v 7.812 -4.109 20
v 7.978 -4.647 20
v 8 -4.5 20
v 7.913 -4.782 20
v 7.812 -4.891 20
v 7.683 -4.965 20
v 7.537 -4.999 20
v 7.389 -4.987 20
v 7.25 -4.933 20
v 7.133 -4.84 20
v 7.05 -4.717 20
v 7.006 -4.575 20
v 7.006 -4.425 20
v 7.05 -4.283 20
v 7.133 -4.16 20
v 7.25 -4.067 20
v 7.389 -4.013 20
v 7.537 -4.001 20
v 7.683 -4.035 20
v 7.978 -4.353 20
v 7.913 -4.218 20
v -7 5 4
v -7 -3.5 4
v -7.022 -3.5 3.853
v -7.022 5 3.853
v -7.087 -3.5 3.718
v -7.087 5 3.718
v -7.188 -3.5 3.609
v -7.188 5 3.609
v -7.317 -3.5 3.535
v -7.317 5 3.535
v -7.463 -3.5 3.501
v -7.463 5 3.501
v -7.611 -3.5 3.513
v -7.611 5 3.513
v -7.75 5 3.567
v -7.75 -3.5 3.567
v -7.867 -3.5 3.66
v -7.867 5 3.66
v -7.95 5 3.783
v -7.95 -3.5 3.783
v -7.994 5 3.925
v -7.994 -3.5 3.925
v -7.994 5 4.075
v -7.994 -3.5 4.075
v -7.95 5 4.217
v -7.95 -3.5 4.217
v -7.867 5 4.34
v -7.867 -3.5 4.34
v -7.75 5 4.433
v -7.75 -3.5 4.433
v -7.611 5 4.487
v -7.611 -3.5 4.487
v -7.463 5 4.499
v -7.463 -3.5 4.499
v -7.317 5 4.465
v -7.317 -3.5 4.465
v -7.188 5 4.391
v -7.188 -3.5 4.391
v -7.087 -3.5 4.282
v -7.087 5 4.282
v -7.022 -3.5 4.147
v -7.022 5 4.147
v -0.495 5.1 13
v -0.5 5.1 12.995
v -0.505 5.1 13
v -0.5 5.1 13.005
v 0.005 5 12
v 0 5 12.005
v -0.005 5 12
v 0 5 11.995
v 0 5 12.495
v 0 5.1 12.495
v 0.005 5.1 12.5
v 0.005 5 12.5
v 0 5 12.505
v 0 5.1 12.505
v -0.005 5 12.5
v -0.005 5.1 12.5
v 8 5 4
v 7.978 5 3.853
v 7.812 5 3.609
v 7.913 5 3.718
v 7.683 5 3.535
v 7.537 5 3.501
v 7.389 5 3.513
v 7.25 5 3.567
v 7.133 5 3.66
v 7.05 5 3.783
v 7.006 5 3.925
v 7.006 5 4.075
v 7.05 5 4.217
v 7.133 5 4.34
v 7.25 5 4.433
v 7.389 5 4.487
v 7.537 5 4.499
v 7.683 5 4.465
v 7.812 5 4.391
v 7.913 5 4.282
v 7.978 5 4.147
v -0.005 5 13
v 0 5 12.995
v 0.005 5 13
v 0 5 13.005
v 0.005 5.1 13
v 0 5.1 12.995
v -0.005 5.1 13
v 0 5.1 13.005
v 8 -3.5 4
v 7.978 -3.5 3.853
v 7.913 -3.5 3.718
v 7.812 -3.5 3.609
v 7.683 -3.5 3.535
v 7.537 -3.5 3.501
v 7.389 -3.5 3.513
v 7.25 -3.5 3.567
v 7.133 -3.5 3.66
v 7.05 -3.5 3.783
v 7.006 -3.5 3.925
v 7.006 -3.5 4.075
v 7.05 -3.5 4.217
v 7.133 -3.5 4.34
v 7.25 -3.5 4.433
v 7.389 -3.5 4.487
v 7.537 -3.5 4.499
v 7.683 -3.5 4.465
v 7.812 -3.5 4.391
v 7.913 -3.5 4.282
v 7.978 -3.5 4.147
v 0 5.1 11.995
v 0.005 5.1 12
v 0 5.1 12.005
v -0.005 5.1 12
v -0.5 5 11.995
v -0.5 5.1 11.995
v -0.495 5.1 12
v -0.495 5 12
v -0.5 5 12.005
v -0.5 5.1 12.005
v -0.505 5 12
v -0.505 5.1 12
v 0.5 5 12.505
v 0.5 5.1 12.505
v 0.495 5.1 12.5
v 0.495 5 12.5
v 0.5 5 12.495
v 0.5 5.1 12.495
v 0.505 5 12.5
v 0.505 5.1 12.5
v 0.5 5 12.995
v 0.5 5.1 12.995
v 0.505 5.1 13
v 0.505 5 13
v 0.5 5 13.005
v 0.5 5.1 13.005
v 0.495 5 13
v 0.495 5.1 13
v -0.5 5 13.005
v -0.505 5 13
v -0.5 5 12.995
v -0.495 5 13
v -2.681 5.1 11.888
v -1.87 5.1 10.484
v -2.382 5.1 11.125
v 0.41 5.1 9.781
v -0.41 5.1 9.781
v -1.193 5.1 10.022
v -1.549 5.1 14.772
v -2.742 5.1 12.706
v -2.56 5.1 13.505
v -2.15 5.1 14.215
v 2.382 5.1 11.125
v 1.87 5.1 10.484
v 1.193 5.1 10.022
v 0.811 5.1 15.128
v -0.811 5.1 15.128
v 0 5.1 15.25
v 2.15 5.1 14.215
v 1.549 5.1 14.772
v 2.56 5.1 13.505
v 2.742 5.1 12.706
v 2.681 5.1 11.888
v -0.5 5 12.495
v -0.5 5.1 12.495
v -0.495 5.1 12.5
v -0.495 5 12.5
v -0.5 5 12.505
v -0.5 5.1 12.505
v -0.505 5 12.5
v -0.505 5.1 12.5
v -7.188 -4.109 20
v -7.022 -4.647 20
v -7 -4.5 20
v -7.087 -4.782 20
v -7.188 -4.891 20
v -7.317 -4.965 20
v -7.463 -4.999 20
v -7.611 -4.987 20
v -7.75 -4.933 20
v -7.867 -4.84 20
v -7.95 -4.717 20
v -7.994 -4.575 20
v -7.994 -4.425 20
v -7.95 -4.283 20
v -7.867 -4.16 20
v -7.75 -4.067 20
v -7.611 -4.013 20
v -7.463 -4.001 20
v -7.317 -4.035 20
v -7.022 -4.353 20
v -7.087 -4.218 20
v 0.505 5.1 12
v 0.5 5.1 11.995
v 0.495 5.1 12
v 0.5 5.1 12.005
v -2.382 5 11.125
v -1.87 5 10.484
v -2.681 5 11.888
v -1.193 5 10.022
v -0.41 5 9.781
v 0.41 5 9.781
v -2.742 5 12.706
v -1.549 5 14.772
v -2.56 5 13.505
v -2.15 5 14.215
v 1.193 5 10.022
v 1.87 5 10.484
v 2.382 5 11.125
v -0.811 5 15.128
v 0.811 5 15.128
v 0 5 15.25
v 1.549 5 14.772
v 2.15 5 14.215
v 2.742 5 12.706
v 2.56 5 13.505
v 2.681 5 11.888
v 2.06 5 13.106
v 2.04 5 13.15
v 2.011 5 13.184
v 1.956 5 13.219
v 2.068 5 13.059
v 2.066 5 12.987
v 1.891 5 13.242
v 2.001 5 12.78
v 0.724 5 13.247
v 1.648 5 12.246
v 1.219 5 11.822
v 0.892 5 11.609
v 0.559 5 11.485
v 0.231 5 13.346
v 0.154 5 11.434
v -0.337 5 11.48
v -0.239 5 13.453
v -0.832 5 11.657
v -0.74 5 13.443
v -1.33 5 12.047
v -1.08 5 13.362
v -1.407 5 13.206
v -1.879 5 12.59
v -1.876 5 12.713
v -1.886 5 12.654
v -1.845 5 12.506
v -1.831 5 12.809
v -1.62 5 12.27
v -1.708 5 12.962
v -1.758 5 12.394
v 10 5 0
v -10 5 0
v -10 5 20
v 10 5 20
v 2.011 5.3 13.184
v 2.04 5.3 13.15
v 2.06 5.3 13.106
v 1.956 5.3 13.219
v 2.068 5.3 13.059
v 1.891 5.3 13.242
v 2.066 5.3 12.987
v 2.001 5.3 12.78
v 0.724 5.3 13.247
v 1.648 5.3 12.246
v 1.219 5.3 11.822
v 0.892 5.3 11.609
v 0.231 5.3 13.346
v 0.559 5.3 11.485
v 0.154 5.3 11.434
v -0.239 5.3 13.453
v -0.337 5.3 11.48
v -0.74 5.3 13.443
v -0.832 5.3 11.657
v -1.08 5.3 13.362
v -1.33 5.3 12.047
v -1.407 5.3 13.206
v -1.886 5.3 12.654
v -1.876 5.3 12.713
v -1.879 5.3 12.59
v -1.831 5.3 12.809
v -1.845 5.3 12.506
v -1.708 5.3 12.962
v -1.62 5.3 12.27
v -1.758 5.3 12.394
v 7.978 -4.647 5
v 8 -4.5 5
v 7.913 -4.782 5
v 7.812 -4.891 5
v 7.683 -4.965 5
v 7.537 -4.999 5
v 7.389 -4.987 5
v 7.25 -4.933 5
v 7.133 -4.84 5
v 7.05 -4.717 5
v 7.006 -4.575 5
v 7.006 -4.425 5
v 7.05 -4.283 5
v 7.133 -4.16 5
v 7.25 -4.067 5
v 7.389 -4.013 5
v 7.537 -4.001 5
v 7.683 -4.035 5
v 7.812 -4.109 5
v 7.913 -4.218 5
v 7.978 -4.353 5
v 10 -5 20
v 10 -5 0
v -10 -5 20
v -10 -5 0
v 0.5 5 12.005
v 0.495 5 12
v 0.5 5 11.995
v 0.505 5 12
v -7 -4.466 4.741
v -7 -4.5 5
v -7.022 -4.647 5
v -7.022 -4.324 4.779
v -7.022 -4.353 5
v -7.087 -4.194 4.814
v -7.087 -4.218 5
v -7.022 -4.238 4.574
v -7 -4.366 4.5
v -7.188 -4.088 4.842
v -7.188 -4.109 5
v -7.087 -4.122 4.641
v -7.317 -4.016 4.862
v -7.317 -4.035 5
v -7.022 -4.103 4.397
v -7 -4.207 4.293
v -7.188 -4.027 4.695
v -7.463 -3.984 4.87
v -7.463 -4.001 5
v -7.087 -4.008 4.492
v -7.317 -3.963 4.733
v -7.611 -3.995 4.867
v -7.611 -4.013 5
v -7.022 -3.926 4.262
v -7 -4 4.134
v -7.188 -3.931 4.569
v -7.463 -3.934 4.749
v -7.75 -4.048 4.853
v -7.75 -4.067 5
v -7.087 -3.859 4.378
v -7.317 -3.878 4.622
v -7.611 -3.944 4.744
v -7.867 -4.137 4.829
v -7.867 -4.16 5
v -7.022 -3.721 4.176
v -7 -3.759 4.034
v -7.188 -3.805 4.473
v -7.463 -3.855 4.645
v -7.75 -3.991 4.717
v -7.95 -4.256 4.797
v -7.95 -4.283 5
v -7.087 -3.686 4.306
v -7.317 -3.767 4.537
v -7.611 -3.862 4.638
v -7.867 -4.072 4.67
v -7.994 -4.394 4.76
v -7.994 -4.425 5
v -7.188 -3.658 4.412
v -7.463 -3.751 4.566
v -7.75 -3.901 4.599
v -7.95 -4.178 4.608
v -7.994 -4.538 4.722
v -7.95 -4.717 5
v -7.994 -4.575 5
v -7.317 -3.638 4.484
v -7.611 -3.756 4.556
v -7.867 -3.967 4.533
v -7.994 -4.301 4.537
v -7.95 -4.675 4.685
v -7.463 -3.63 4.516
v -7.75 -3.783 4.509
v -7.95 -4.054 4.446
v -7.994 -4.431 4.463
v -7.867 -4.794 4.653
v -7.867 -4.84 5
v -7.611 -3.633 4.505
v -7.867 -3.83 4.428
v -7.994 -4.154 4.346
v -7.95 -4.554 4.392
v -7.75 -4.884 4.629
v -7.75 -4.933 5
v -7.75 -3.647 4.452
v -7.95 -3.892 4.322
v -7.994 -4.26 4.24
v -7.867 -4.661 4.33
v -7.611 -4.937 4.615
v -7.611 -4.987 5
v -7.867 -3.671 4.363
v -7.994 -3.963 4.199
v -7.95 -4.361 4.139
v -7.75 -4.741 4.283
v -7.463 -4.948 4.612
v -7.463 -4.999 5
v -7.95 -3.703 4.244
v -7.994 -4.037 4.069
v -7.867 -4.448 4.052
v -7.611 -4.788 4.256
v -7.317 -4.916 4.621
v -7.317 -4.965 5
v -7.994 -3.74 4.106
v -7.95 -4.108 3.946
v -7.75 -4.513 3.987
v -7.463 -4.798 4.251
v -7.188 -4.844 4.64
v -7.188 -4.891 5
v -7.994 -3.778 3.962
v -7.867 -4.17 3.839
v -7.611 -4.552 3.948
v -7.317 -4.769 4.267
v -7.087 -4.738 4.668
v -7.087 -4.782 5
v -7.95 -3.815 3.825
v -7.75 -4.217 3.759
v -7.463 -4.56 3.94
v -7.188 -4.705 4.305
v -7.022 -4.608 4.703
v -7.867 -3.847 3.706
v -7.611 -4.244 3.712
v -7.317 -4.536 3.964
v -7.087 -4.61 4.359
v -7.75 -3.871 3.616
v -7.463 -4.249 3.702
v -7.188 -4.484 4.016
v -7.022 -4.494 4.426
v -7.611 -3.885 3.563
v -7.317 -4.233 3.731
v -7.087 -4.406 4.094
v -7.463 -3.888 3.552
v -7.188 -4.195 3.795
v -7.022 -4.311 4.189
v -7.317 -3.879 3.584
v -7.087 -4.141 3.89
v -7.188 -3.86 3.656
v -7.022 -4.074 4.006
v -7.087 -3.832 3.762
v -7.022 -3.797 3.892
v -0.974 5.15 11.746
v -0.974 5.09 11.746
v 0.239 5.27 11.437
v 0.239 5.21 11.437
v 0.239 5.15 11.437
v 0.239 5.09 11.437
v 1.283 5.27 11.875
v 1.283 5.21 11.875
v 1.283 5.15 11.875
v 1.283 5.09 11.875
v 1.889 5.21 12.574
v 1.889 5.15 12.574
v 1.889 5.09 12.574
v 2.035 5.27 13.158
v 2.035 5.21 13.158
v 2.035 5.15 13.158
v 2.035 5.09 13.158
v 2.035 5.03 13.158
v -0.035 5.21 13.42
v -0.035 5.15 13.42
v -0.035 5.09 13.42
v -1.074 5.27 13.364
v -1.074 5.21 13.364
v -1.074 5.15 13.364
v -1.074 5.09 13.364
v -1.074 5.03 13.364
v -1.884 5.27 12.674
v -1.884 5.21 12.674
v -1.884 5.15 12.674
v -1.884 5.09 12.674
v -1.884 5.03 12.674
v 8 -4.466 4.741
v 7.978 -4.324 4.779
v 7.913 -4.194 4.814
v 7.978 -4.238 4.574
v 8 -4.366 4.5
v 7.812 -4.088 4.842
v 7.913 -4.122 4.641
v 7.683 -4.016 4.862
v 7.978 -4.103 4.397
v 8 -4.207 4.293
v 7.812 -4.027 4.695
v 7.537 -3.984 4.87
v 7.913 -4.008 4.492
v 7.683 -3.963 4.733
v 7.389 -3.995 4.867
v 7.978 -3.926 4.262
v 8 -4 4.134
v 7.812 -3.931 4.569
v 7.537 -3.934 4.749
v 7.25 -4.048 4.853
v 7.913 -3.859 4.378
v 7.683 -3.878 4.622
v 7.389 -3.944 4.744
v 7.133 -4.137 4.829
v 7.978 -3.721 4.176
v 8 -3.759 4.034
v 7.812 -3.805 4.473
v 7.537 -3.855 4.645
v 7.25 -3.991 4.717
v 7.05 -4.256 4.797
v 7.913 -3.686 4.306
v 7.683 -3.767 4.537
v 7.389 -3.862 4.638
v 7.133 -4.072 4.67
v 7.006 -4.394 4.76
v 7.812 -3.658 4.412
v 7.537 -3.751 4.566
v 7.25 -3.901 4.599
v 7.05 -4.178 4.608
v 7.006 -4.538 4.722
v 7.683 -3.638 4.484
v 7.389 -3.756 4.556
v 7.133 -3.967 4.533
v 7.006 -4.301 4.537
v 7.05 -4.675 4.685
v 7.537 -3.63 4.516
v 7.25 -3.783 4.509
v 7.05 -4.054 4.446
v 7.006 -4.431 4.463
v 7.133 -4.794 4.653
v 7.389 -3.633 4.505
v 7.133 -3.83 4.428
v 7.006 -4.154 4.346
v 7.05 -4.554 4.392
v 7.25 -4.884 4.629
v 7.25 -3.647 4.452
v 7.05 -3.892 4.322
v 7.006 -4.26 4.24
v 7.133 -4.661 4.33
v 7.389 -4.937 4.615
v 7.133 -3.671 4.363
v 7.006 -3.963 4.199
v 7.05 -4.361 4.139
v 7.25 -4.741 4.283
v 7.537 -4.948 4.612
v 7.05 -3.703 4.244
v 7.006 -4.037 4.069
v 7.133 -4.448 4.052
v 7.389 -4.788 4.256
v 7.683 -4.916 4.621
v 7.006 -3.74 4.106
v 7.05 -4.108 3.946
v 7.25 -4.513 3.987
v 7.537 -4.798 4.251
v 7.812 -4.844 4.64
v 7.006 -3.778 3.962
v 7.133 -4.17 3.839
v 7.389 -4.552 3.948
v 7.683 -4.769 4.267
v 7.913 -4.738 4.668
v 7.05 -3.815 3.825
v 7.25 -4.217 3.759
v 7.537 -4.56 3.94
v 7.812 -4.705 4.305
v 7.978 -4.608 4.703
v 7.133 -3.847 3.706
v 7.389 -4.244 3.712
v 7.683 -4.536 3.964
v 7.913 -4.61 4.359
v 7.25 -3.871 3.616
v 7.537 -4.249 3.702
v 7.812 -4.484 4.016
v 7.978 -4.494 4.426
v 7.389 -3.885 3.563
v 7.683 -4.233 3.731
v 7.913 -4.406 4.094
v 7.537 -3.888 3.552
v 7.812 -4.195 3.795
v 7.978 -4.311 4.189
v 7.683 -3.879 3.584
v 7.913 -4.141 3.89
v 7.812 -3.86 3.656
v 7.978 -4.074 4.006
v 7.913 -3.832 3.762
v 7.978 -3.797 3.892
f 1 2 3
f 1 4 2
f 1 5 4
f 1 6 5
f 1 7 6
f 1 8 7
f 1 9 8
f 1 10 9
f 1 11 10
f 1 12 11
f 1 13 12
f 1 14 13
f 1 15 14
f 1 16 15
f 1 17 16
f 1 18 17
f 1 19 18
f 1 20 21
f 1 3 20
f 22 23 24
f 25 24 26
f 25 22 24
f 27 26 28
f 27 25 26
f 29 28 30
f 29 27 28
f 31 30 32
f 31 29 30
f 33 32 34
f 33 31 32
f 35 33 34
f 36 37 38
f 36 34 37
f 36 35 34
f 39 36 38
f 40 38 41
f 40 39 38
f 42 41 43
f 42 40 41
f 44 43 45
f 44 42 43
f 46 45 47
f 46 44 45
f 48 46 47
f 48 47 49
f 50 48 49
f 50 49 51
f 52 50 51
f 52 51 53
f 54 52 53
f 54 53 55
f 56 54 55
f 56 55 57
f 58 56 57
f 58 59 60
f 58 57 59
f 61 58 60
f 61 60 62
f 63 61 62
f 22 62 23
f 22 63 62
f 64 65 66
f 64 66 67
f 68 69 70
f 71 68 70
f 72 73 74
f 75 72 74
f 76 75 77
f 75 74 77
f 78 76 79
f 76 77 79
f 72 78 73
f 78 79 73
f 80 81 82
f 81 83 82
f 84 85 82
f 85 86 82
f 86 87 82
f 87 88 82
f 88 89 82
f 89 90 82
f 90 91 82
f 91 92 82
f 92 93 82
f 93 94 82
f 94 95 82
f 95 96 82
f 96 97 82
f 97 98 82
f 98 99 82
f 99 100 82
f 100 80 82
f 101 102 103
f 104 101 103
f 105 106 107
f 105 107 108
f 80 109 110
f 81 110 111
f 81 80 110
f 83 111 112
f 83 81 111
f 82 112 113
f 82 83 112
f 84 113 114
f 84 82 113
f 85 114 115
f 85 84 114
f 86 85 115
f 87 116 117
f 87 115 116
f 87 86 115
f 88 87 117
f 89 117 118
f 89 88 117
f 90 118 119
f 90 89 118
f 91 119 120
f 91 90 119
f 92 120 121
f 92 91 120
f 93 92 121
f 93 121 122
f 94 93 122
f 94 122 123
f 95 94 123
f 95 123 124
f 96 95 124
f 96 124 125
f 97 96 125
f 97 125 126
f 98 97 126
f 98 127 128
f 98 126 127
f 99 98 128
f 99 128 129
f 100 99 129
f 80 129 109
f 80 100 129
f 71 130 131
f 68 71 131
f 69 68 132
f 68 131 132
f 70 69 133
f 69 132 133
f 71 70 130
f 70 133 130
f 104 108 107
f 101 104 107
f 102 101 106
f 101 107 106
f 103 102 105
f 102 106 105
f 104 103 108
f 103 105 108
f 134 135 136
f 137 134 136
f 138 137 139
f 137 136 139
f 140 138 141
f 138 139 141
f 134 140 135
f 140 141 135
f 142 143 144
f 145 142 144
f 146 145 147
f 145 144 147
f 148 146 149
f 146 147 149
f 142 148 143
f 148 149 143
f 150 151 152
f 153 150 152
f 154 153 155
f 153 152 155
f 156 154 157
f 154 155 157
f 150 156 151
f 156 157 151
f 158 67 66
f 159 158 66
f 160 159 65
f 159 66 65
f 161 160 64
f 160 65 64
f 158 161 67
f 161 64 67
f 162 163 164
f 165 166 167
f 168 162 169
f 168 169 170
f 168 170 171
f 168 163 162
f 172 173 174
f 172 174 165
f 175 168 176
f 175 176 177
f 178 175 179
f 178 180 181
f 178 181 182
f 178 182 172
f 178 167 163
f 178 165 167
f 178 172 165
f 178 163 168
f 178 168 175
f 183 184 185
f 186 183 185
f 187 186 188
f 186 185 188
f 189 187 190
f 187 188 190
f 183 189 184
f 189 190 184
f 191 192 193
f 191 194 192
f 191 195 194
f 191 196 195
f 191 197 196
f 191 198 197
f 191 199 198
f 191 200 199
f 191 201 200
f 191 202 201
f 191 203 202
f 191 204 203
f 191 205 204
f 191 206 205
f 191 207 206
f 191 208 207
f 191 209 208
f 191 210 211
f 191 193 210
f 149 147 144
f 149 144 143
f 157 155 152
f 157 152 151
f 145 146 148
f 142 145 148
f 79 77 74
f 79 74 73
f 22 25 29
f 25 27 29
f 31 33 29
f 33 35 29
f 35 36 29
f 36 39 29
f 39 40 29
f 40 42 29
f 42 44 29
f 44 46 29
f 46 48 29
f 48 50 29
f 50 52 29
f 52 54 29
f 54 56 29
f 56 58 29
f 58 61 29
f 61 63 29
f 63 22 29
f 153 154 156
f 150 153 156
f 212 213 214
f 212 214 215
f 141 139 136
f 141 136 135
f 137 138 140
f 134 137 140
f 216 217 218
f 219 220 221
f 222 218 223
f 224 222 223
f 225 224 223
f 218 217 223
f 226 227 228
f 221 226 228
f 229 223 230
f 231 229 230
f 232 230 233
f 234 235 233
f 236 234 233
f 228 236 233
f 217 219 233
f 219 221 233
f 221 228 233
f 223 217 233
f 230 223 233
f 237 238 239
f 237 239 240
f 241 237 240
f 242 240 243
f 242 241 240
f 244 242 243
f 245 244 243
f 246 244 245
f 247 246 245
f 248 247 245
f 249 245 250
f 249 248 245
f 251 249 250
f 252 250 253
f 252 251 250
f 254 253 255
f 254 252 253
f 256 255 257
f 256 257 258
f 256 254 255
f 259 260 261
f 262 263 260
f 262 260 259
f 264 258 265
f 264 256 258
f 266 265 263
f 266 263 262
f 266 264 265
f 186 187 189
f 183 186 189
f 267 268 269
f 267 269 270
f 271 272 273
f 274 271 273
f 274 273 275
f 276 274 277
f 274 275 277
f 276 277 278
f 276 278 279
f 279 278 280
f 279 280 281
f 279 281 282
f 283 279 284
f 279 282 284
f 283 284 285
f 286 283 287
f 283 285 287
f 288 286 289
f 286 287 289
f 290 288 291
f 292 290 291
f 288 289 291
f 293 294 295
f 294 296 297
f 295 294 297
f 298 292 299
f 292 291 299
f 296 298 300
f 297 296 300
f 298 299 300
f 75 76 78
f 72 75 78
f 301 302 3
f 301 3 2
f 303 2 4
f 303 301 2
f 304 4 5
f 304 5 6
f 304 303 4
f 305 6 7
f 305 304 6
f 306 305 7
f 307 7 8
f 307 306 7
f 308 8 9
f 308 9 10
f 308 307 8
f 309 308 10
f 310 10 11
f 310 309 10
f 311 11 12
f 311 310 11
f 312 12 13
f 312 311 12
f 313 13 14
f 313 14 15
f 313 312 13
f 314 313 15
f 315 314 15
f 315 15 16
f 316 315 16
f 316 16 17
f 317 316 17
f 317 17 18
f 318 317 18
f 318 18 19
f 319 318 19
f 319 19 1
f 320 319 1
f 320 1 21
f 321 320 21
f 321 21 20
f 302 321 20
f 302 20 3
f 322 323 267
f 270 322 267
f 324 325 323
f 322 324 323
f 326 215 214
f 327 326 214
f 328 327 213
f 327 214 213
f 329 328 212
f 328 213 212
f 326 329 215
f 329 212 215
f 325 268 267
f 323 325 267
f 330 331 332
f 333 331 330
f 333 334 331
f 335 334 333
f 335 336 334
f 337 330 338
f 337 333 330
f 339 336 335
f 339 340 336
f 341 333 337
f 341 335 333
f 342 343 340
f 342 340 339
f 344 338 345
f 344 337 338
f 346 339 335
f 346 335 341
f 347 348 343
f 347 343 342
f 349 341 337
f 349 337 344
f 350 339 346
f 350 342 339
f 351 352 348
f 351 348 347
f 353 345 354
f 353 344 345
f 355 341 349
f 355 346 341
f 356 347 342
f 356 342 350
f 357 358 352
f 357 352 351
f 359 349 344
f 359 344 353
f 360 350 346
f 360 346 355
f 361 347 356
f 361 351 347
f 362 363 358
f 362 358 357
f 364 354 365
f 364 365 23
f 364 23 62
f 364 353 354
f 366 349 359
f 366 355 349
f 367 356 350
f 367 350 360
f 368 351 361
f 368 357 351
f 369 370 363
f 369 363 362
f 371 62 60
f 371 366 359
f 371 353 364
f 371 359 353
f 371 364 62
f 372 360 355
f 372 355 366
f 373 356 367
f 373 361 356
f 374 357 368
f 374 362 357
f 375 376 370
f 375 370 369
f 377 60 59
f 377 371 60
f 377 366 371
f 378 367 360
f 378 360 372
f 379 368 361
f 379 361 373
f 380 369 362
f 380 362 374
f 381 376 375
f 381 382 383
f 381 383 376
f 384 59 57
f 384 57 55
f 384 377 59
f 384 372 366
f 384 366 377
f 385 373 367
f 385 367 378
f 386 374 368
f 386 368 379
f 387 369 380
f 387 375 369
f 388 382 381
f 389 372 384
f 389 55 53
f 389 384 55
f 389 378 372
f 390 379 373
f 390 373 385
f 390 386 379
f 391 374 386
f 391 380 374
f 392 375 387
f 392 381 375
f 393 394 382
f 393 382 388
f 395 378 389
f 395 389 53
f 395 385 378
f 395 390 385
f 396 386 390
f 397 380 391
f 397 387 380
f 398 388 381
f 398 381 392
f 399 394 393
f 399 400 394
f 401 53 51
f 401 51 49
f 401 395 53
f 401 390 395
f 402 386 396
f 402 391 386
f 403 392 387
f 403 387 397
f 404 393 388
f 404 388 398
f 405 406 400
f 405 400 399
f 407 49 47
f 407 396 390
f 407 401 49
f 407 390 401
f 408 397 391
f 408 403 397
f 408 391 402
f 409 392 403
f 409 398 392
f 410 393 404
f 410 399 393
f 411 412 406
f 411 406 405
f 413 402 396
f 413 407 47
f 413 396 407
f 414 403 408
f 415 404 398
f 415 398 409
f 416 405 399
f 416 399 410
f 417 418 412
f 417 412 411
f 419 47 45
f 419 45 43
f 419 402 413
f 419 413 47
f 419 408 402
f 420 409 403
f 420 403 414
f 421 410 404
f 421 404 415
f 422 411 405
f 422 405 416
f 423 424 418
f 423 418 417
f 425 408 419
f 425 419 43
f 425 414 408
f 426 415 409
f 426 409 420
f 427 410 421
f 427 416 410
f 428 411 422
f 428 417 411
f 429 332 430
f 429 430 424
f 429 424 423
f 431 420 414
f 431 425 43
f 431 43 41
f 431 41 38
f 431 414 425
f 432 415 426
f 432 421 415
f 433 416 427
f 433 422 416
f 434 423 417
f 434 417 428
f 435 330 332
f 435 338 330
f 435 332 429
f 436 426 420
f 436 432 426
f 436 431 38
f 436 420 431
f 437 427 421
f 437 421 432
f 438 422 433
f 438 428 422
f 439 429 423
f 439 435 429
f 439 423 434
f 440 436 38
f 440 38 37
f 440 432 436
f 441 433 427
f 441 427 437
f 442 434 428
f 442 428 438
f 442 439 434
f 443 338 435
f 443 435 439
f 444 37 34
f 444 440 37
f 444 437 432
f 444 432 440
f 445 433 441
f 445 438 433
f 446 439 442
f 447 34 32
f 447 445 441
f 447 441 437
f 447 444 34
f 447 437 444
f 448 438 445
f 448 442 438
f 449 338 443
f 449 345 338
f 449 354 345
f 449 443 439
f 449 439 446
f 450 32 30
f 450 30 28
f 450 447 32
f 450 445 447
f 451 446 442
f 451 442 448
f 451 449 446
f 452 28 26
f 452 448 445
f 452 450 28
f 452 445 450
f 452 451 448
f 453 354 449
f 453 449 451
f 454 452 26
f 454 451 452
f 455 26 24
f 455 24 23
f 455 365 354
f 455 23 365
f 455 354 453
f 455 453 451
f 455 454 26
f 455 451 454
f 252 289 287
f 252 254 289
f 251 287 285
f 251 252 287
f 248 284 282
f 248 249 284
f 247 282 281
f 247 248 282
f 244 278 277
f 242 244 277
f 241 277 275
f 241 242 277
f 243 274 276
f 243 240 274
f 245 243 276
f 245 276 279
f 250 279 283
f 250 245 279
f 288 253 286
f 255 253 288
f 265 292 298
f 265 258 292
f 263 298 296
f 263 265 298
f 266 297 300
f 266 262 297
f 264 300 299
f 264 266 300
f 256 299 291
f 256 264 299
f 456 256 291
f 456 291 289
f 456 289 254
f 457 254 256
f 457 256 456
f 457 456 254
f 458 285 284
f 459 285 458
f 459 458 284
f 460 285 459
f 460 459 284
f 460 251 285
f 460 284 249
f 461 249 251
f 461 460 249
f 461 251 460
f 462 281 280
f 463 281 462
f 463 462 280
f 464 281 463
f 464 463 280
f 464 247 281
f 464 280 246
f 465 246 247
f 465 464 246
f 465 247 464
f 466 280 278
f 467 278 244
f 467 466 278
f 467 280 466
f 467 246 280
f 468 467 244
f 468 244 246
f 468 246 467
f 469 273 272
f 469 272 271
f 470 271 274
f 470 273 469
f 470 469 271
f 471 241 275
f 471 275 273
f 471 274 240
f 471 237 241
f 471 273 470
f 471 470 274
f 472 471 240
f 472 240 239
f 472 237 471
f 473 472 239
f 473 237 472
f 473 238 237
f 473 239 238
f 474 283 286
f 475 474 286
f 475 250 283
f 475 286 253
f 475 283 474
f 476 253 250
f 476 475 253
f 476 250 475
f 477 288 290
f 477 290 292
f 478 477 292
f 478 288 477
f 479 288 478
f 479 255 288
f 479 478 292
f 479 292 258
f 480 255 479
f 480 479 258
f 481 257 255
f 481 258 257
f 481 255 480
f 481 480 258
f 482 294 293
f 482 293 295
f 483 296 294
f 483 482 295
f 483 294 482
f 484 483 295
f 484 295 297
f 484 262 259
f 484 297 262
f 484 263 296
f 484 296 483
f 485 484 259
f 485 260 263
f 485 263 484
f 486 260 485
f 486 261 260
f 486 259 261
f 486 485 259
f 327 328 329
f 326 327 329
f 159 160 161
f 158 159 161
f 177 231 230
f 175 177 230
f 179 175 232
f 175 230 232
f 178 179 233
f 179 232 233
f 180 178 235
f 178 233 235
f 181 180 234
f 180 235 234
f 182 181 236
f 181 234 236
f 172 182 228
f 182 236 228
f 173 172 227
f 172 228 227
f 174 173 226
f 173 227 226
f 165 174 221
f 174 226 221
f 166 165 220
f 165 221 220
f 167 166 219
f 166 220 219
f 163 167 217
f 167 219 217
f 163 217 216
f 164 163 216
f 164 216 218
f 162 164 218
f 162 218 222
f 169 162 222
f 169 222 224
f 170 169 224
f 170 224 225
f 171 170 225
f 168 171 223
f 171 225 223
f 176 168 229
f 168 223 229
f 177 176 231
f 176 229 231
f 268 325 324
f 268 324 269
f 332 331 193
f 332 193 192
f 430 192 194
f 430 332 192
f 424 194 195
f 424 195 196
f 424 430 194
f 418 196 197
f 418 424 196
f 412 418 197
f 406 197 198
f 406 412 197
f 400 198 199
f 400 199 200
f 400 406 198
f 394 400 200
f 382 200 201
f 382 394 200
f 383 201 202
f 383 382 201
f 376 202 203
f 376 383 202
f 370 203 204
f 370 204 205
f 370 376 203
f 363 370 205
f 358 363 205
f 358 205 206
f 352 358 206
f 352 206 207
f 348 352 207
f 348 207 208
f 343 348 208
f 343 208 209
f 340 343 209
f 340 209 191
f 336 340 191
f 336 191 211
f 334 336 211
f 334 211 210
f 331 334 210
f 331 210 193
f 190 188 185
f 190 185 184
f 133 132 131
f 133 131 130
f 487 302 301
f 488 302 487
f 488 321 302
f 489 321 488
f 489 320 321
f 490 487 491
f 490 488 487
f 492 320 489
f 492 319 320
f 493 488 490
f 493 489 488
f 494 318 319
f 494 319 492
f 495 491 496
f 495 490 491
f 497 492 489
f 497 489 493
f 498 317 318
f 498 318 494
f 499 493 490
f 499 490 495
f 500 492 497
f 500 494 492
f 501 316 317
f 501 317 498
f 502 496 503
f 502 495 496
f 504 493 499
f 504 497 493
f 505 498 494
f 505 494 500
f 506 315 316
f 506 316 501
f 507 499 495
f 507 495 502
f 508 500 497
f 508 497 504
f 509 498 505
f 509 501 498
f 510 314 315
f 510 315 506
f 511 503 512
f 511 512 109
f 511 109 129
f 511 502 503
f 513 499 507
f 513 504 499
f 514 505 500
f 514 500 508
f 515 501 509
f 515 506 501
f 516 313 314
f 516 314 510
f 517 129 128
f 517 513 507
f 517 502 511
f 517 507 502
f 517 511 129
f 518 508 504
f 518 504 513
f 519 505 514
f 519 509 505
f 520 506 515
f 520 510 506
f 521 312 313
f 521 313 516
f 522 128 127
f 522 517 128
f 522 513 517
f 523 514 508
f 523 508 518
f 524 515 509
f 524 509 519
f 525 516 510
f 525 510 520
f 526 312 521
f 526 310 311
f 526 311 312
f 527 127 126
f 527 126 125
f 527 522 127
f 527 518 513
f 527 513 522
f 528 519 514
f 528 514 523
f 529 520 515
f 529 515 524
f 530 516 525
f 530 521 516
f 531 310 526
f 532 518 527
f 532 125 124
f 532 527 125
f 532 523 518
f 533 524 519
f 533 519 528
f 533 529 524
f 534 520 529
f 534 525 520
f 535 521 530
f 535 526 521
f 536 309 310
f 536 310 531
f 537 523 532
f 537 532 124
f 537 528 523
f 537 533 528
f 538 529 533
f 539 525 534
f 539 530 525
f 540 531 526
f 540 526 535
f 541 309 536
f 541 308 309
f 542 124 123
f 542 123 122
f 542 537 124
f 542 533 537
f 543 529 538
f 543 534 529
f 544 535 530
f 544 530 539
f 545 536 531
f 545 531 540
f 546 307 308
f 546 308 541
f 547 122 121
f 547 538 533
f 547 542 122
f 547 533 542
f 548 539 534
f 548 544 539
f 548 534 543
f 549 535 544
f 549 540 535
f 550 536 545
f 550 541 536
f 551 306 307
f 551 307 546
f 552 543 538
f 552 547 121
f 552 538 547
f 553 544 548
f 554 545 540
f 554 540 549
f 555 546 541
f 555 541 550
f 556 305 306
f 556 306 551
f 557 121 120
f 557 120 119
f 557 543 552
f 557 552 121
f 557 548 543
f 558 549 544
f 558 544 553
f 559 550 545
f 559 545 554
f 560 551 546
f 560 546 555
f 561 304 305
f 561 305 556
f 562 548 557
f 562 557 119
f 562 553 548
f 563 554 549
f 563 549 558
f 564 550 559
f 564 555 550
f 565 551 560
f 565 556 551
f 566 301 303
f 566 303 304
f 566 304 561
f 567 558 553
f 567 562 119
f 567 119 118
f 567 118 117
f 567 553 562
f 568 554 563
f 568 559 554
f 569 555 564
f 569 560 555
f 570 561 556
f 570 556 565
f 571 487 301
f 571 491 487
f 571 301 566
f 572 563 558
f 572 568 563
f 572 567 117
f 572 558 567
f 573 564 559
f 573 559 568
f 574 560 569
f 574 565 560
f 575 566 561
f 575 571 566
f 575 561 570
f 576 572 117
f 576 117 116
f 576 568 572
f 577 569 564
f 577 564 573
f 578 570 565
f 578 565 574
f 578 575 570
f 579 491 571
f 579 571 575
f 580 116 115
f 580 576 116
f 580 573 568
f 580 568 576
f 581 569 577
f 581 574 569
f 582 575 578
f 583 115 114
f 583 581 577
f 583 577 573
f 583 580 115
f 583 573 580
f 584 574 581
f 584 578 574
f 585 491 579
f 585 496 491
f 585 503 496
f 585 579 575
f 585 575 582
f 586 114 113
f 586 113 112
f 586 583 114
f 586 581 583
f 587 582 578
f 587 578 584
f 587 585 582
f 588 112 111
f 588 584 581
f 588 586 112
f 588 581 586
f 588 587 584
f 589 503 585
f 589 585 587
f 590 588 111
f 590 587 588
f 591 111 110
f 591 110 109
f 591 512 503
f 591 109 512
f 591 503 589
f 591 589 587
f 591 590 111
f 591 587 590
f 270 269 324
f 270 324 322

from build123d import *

# Parameters (mm, degrees)
SKETCH1_W             = 20
SKETCH1_H             = 10
BOSS_EXTRUDE1_DEPTH   = 20
SKETCH2_R             = 0.5
SKETCH5_R             = 2.75
BOSS_EXTRUDE4_DEPTH   = 0.1
SKETCH8_R             = 0.005
BOSS_EXTRUDE5_DEPTH   = 0.1
BOSS_EXTRUDE5_2_DEPTH = 0.1
BOSS_EXTRUDE5_3_DEPTH = 0.1
BOSS_EXTRUDE5_4_DEPTH = 0.1
BOSS_EXTRUDE5_5_DEPTH = 0.1
BOSS_EXTRUDE5_6_DEPTH = 0.1
BOSS_EXTRUDE5_7_DEPTH = 0.1
BOSS_EXTRUDE5_8_DEPTH = 0.1
BOSS_EXTRUDE5_9_DEPTH = 0.1
SLICE_2_DEPTH         = 0.3


with BuildPart() as part:
    # Sketch1 → Boss-Extrude1 (new body)
    with BuildSketch(Plane.XY):
        Rectangle(SKETCH1_W, SKETCH1_H)
    extrude(amount=BOSS_EXTRUDE1_DEPTH)


with BuildPart() as body_2:
    # ag/agcl electrodes: sweep along a path in Sketch3
    with BuildLine(Plane(origin=(7.5, 0, 0), x_dir=(0, 0, -1), z_dir=(1, 0, 0))) as ag_agcl_electrodes_path:
        Line((-20, -4.5), (-5, -4.5))
        ThreePointArc((-5, -4.5), (-4.292893219, -4.207106781), (-4, -3.5))
        Line((-4, -3.5), (-4, 5))
    # Sketch2 → ag/agcl electrodes (sweep)
    with BuildSketch(Plane.XY.offset(20)):
        with Locations((-7.5, -4.5)):
            Circle(SKETCH2_R)
        with Locations((7.5, -4.5)):
            Circle(SKETCH2_R)
    sweep(path=ag_agcl_electrodes_path.line)


with BuildPart() as body_3:
    # Sketch5 → Boss-Extrude4 (new body)
    with BuildSketch(Plane(origin=(0, 5, 0), x_dir=(1, 0, 0), z_dir=(0, 1, 0))):
        with Locations(Location((0, -12.5, 0), (0, 0, 270))):
            Circle(SKETCH5_R)
    extrude(amount=BOSS_EXTRUDE4_DEPTH)


with BuildPart() as body_4:
    # Sketch8 → Boss-Extrude5 (new body)
    with BuildSketch(Plane(origin=(0, 5.1, 0), x_dir=(-1, 0, 0), z_dir=(0, -1, 0))):
        with Locations(Location((0, -12.5, 0), (0, 0, 90))):
            Circle(SKETCH8_R)
    extrude(amount=BOSS_EXTRUDE5_DEPTH)


with BuildPart() as body_5:
    # Sketch8 → Boss-Extrude5 2 (new body)
    with BuildSketch(Plane(origin=(0, 5.1, 0), x_dir=(-1, 0, 0), z_dir=(0, -1, 0))):
        with Locations(Location((0.5, -12.5, 0), (0, 0, 90))):
            Circle(SKETCH8_R)
    extrude(amount=BOSS_EXTRUDE5_2_DEPTH)


with BuildPart() as body_6:
    # Sketch8 → Boss-Extrude5 3 (new body)
    with BuildSketch(Plane(origin=(0, 5.1, 0), x_dir=(-1, 0, 0), z_dir=(0, -1, 0))):
        with Locations(Location((0.5, -12, 0), (0, 0, 90))):
            Circle(SKETCH8_R)
    extrude(amount=BOSS_EXTRUDE5_3_DEPTH)


with BuildPart() as body_7:
    # Sketch8 → Boss-Extrude5 4 (new body)
    with BuildSketch(Plane(origin=(0, 5.1, 0), x_dir=(-1, 0, 0), z_dir=(0, -1, 0))):
        with Locations(Location((0, -12, 0), (0, 0, 90))):
            Circle(SKETCH8_R)
    extrude(amount=BOSS_EXTRUDE5_4_DEPTH)


with BuildPart() as body_8:
    # Sketch8 → Boss-Extrude5 5 (new body)
    with BuildSketch(Plane(origin=(0, 5.1, 0), x_dir=(-1, 0, 0), z_dir=(0, -1, 0))):
        with Locations(Location((0.5, -13, 0), (0, 0, 270))):
            Circle(SKETCH8_R)
    extrude(amount=BOSS_EXTRUDE5_5_DEPTH)


with BuildPart() as body_9:
    # Sketch8 → Boss-Extrude5 6 (new body)
    with BuildSketch(Plane(origin=(0, 5.1, 0), x_dir=(-1, 0, 0), z_dir=(0, -1, 0))):
        with Locations(Location((0, -13, 0), (0, 0, 270))):
            Circle(SKETCH8_R)
    extrude(amount=BOSS_EXTRUDE5_6_DEPTH)


with BuildPart() as body_10:
    # Sketch8 → Boss-Extrude5 7 (new body)
    with BuildSketch(Plane(origin=(0, 5.1, 0), x_dir=(-1, 0, 0), z_dir=(0, -1, 0))):
        with Locations(Location((-0.5, -13, 0), (0, 0, 90))):
            Circle(SKETCH8_R)
    extrude(amount=BOSS_EXTRUDE5_7_DEPTH)


with BuildPart() as body_11:
    # Sketch8 → Boss-Extrude5 8 (new body)
    with BuildSketch(Plane(origin=(0, 5.1, 0), x_dir=(-1, 0, 0), z_dir=(0, -1, 0))):
        with Locations(Location((-0.5, -12, 0), (0, 0, 270))):
            Circle(SKETCH8_R)
    extrude(amount=BOSS_EXTRUDE5_8_DEPTH)


with BuildPart() as body_12:
    # Sketch8 → Boss-Extrude5 9 (new body)
    with BuildSketch(Plane(origin=(0, 5.1, 0), x_dir=(-1, 0, 0), z_dir=(0, -1, 0))):
        with Locations(Location((-0.5, -12.5, 0), (0, 0, 270))):
            Circle(SKETCH8_R)
    extrude(amount=BOSS_EXTRUDE5_9_DEPTH)


with BuildPart() as body_13:
    # Sketch4 → slice 2 (new body)
    with BuildSketch(Plane(origin=(0, 5, 0), x_dir=(1, 0, 0), z_dir=(0, 1, 0))):
        with BuildLine():
            add(Edge.make_bspline(
                [(-1.329786825, -12.04709664), (-1.196342031, -11.939424685), (-0.824147777, -11.548957834), (0.251281573, -11.322574475), (1.372606671, -11.746573561), (2.652909809, -13.571837262), (0.780549472, -13.104467787), (-0.122057097, -13.506347246), (-0.994791107, -13.460960152), (-1.586432094, -13.116889112), (-2.086144249, -12.539169772), (-1.569499382, -12.240512354), (-1.329786825, -12.04709664)],
                knots=[0, 0, 0, 0, 0.049562645, 0.182817887, 0.303261475, 0.461561344, 0.613381106, 0.684437877, 0.79516613, 0.866564728, 0.910968514, 1, 1, 1, 1], degree=3))
        make_face()
    extrude(amount=SLICE_2_DEPTH)


solid = Compound([part.part, body_2.part, body_3.part, body_4.part, body_5.part, body_6.part, body_7.part, body_8.part, body_9.part, body_10.part, body_11.part, body_12.part, body_13.part])
